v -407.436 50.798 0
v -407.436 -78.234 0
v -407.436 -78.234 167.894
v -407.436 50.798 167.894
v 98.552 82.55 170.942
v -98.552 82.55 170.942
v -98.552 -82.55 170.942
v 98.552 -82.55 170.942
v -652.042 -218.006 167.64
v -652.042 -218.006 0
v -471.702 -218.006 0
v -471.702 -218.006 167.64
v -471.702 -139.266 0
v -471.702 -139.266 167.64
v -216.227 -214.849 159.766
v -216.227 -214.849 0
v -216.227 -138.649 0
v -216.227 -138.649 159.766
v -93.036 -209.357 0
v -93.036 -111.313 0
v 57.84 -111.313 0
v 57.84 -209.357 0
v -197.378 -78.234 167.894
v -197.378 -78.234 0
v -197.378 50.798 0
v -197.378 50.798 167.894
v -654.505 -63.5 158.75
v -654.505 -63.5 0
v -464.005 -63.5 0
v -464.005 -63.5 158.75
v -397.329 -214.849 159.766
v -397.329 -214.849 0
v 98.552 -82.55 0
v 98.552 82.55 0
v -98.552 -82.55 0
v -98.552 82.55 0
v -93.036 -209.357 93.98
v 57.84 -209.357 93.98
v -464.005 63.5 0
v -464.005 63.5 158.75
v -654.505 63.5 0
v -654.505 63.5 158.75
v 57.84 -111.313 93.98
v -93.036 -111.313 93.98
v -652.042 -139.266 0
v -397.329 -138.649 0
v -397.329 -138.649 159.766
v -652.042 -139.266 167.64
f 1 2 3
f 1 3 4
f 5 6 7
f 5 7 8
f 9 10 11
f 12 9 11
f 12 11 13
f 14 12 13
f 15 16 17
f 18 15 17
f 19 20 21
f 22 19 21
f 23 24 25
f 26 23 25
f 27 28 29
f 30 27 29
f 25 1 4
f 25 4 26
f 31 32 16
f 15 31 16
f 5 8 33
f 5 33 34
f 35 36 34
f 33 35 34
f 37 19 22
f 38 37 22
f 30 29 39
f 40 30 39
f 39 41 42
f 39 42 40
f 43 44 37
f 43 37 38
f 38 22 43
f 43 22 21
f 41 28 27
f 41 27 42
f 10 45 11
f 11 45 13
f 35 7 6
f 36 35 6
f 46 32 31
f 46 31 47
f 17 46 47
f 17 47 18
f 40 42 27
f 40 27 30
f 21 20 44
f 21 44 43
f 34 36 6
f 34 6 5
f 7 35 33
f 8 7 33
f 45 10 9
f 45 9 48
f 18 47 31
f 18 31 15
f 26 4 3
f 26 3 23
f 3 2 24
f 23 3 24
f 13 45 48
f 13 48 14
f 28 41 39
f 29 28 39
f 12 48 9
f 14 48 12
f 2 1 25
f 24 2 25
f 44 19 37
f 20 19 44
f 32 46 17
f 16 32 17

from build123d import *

# Parameters (mm, degrees)
F0_W      = 197.104
F0_H      = 165.1
F1_DEPTH  = 170.942
F2_W      = 210.058
F2_H      = 129.032
F3_DEPTH  = 167.894
F4_W      = 181.102
F4_H      = 76.2
F5_DEPTH  = 159.766
F6_W      = 150.876
F6_H      = 98.044
F7_DEPTH  = 93.98
F8_W      = 190.5
F8_H      = 127
F9_DEPTH  = 158.75
F10_W     = 180.34
F10_H     = 78.74
F11_DEPTH = 167.64


with BuildPart() as f1:
    # F0 (on Top) → F1 (new body)
    with BuildSketch(Plane.XY):
        Rectangle(F0_W, F0_H)
    extrude(amount=F1_DEPTH)


with BuildPart() as f3:
    # F2 (on Top) → F3 (new body)
    with BuildSketch(Plane.XY):
        with Locations((-302.406549, -13.718079)):
            Rectangle(F2_W, F2_H)
    extrude(amount=F3_DEPTH)


with BuildPart() as f5:
    # F4 (on Top) → F5 (new body)
    with BuildSketch(Plane.XY):
        with Locations((-306.777716, -176.749136)):
            Rectangle(F4_W, F4_H)
    extrude(amount=F5_DEPTH)


with BuildPart() as f7:
    # F6 (on Top) → F7 (new body)
    with BuildSketch(Plane.XY):
        with Locations((-17.598253, -160.335455)):
            Rectangle(F6_W, F6_H)
    extrude(amount=F7_DEPTH)


with BuildPart() as f9:
    # F8 (on Top) → F9 (new body)
    with BuildSketch(Plane.XY):
        with Locations((-559.25452, 0)):
            Rectangle(F8_W, F8_H)
    extrude(amount=F9_DEPTH)


with BuildPart() as f11:
    # F10 (on Top) → F11 (new body)
    with BuildSketch(Plane.XY):
        with Locations((-561.871514, -178.636187)):
            Rectangle(F10_W, F10_H)
    extrude(amount=F11_DEPTH)


solid = Compound([f1.part, f3.part, f5.part, f7.part, f9.part, f11.part])
